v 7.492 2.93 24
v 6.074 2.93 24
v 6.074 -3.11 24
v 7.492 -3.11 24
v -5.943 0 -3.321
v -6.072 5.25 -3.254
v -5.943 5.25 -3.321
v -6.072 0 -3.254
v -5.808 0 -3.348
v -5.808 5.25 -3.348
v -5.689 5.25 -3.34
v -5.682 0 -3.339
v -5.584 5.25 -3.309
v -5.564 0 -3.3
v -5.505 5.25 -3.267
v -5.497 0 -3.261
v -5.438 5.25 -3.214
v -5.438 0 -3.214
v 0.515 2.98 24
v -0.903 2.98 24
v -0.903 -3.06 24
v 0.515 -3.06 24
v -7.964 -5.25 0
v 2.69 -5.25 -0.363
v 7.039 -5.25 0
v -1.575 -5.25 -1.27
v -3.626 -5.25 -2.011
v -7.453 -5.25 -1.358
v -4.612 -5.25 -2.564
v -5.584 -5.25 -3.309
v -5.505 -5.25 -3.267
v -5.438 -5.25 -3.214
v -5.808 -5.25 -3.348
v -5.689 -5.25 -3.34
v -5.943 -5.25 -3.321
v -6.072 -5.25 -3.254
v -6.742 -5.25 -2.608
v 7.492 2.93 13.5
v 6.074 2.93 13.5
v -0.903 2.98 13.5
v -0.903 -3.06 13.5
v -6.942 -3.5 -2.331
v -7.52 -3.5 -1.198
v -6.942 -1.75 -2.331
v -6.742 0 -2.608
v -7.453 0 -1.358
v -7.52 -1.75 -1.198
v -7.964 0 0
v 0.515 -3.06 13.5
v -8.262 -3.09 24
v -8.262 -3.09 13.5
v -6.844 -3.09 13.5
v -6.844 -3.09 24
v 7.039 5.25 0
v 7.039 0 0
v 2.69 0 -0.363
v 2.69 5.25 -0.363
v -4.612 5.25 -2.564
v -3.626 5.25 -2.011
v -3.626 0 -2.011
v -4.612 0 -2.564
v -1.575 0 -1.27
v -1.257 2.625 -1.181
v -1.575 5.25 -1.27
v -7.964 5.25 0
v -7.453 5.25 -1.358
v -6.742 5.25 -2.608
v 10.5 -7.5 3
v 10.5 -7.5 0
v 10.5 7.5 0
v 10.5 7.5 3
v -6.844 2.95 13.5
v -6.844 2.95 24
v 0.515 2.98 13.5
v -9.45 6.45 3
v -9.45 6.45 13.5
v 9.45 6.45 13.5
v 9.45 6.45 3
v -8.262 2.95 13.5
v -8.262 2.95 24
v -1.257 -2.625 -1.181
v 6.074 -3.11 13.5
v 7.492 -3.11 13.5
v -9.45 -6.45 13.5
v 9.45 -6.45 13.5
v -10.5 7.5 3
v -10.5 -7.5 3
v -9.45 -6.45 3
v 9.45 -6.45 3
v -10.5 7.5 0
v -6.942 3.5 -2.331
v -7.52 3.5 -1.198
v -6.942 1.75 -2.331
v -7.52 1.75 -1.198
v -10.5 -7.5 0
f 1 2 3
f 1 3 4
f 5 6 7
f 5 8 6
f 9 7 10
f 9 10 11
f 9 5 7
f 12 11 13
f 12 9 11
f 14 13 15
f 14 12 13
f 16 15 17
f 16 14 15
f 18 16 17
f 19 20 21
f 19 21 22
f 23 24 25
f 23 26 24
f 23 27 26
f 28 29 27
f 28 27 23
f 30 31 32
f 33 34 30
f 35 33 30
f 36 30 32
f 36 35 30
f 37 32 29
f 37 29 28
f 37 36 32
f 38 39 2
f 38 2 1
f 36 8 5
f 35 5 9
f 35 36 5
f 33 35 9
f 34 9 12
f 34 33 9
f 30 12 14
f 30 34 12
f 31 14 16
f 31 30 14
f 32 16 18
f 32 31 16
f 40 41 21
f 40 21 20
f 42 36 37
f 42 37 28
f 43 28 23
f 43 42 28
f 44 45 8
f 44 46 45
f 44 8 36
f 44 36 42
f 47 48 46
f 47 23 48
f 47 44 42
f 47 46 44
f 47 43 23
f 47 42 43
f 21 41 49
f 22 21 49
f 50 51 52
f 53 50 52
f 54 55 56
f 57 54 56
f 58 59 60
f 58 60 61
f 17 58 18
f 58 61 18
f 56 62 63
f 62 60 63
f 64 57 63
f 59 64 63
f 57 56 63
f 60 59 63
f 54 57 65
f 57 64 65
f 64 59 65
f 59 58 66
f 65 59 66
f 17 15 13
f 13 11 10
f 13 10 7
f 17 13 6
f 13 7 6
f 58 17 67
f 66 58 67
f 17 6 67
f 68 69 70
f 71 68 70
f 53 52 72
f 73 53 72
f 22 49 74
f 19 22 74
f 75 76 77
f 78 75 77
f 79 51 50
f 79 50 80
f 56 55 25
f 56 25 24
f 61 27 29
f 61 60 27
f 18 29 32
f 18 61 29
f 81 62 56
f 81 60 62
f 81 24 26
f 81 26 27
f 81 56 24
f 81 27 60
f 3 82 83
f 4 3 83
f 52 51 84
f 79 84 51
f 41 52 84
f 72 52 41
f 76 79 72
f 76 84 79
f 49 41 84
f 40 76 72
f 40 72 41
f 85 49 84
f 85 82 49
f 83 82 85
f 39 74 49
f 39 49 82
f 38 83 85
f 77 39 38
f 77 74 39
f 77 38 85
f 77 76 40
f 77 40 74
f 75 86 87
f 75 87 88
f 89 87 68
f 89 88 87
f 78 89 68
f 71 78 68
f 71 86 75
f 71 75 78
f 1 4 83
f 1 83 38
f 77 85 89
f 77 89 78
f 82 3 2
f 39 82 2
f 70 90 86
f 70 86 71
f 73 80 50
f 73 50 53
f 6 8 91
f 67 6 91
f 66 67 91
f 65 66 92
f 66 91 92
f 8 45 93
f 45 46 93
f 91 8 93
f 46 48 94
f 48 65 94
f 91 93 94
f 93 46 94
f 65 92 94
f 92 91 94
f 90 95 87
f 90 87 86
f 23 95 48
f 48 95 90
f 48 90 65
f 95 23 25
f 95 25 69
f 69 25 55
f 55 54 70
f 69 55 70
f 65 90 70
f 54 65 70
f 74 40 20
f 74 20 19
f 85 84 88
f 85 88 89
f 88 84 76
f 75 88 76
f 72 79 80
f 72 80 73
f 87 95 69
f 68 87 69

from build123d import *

# Parameters (mm, degrees)
CROQUIS1_W              = 21
CROQUIS1_H              = 15
SALIENTE_EXTRUIR1_DEPTH = 13.5
CROQUIS2_W              = 21
CROQUIS2_H              = 15
CROQUIS2_W_2            = 18.9
CROQUIS2_H_2            = 12.9
CORTAR_EXTRUIR1_DEPTH   = 10.5
SALIENTE_EXTRUIR2_DEPTH = 5.25
REDONDEO1_R             = 0.5
CROQUIS4_W              = 1.418006124
CROQUIS4_H              = 6.039970015
CROQUIS4_H_2            = 6.039970016
SALIENTE_EXTRUIR3_DEPTH = 10.5


with BuildPart() as part:
    # Croquis1 → Saliente-Extruir1 (new body)
    with BuildSketch(Plane.XY):
        Rectangle(CROQUIS1_W, CROQUIS1_H)
    extrude(amount=SALIENTE_EXTRUIR1_DEPTH)

    # Croquis2 → Cortar-Extruir1 (cut)
    with BuildSketch(Plane.XY.offset(13.5)):
        Rectangle(CROQUIS2_W, CROQUIS2_H)
        Rectangle(CROQUIS2_W_2, CROQUIS2_H_2, mode=Mode.SUBTRACT)
    extrude(amount=-CORTAR_EXTRUIR1_DEPTH, mode=Mode.SUBTRACT)

    # Croquis3 → Saliente-Extruir2 (add, symmetric)
    with BuildSketch(Plane(origin=(0, 0, 0), x_dir=(1, 0, 0), z_dir=(0, 1, 0))):
        with BuildLine():
            Line((7.039280928, 0), (-7.963522393, 0))
            add(Edge.make_bspline(
                [(-5.706653699, 3.481138081), (-7.057942912, 2.763187698), (-7.488467217, 1.307416204), (-7.963522393, 0)],
                knots=[0, 0, 0, 0, 1, 1, 1, 1], degree=3))
            add(Edge.make_bspline(
                [(7.039280928, 0), (4.224020061, 0.069217615), (-0.214677684, 0.66683062), (-4.502921069, 2.204677744), (-5.706653699, 3.481138081)],
                knots=[0, 0, 0, 0, 0.62405833, 1, 1, 1, 1], degree=3))
        make_face()
    extrude(amount=SALIENTE_EXTRUIR2_DEPTH, both=True)

    # Redondeo1
    redondeo1_edges = [part.edges().sort_by_distance(p)[0] for p in [
        (-5.706653699, -2.625, -3.481138081),
    ]]
    fillet(redondeo1_edges, radius=REDONDEO1_R)

    # Croquis4 → Saliente-Extruir3 (add)
    with BuildSketch(Plane.XY.offset(13.5)):
        with Locations((-7.552748408, -0.069775705)):
            Rectangle(CROQUIS4_W, CROQUIS4_H)
        with Locations((-0.194042943, -0.039922945)):
            Rectangle(CROQUIS4_W, CROQUIS4_H)
        with Locations((6.78276327, -0.08977409)):
            Rectangle(CROQUIS4_W, CROQUIS4_H_2)
    extrude(amount=SALIENTE_EXTRUIR3_DEPTH)


solid = part.part
